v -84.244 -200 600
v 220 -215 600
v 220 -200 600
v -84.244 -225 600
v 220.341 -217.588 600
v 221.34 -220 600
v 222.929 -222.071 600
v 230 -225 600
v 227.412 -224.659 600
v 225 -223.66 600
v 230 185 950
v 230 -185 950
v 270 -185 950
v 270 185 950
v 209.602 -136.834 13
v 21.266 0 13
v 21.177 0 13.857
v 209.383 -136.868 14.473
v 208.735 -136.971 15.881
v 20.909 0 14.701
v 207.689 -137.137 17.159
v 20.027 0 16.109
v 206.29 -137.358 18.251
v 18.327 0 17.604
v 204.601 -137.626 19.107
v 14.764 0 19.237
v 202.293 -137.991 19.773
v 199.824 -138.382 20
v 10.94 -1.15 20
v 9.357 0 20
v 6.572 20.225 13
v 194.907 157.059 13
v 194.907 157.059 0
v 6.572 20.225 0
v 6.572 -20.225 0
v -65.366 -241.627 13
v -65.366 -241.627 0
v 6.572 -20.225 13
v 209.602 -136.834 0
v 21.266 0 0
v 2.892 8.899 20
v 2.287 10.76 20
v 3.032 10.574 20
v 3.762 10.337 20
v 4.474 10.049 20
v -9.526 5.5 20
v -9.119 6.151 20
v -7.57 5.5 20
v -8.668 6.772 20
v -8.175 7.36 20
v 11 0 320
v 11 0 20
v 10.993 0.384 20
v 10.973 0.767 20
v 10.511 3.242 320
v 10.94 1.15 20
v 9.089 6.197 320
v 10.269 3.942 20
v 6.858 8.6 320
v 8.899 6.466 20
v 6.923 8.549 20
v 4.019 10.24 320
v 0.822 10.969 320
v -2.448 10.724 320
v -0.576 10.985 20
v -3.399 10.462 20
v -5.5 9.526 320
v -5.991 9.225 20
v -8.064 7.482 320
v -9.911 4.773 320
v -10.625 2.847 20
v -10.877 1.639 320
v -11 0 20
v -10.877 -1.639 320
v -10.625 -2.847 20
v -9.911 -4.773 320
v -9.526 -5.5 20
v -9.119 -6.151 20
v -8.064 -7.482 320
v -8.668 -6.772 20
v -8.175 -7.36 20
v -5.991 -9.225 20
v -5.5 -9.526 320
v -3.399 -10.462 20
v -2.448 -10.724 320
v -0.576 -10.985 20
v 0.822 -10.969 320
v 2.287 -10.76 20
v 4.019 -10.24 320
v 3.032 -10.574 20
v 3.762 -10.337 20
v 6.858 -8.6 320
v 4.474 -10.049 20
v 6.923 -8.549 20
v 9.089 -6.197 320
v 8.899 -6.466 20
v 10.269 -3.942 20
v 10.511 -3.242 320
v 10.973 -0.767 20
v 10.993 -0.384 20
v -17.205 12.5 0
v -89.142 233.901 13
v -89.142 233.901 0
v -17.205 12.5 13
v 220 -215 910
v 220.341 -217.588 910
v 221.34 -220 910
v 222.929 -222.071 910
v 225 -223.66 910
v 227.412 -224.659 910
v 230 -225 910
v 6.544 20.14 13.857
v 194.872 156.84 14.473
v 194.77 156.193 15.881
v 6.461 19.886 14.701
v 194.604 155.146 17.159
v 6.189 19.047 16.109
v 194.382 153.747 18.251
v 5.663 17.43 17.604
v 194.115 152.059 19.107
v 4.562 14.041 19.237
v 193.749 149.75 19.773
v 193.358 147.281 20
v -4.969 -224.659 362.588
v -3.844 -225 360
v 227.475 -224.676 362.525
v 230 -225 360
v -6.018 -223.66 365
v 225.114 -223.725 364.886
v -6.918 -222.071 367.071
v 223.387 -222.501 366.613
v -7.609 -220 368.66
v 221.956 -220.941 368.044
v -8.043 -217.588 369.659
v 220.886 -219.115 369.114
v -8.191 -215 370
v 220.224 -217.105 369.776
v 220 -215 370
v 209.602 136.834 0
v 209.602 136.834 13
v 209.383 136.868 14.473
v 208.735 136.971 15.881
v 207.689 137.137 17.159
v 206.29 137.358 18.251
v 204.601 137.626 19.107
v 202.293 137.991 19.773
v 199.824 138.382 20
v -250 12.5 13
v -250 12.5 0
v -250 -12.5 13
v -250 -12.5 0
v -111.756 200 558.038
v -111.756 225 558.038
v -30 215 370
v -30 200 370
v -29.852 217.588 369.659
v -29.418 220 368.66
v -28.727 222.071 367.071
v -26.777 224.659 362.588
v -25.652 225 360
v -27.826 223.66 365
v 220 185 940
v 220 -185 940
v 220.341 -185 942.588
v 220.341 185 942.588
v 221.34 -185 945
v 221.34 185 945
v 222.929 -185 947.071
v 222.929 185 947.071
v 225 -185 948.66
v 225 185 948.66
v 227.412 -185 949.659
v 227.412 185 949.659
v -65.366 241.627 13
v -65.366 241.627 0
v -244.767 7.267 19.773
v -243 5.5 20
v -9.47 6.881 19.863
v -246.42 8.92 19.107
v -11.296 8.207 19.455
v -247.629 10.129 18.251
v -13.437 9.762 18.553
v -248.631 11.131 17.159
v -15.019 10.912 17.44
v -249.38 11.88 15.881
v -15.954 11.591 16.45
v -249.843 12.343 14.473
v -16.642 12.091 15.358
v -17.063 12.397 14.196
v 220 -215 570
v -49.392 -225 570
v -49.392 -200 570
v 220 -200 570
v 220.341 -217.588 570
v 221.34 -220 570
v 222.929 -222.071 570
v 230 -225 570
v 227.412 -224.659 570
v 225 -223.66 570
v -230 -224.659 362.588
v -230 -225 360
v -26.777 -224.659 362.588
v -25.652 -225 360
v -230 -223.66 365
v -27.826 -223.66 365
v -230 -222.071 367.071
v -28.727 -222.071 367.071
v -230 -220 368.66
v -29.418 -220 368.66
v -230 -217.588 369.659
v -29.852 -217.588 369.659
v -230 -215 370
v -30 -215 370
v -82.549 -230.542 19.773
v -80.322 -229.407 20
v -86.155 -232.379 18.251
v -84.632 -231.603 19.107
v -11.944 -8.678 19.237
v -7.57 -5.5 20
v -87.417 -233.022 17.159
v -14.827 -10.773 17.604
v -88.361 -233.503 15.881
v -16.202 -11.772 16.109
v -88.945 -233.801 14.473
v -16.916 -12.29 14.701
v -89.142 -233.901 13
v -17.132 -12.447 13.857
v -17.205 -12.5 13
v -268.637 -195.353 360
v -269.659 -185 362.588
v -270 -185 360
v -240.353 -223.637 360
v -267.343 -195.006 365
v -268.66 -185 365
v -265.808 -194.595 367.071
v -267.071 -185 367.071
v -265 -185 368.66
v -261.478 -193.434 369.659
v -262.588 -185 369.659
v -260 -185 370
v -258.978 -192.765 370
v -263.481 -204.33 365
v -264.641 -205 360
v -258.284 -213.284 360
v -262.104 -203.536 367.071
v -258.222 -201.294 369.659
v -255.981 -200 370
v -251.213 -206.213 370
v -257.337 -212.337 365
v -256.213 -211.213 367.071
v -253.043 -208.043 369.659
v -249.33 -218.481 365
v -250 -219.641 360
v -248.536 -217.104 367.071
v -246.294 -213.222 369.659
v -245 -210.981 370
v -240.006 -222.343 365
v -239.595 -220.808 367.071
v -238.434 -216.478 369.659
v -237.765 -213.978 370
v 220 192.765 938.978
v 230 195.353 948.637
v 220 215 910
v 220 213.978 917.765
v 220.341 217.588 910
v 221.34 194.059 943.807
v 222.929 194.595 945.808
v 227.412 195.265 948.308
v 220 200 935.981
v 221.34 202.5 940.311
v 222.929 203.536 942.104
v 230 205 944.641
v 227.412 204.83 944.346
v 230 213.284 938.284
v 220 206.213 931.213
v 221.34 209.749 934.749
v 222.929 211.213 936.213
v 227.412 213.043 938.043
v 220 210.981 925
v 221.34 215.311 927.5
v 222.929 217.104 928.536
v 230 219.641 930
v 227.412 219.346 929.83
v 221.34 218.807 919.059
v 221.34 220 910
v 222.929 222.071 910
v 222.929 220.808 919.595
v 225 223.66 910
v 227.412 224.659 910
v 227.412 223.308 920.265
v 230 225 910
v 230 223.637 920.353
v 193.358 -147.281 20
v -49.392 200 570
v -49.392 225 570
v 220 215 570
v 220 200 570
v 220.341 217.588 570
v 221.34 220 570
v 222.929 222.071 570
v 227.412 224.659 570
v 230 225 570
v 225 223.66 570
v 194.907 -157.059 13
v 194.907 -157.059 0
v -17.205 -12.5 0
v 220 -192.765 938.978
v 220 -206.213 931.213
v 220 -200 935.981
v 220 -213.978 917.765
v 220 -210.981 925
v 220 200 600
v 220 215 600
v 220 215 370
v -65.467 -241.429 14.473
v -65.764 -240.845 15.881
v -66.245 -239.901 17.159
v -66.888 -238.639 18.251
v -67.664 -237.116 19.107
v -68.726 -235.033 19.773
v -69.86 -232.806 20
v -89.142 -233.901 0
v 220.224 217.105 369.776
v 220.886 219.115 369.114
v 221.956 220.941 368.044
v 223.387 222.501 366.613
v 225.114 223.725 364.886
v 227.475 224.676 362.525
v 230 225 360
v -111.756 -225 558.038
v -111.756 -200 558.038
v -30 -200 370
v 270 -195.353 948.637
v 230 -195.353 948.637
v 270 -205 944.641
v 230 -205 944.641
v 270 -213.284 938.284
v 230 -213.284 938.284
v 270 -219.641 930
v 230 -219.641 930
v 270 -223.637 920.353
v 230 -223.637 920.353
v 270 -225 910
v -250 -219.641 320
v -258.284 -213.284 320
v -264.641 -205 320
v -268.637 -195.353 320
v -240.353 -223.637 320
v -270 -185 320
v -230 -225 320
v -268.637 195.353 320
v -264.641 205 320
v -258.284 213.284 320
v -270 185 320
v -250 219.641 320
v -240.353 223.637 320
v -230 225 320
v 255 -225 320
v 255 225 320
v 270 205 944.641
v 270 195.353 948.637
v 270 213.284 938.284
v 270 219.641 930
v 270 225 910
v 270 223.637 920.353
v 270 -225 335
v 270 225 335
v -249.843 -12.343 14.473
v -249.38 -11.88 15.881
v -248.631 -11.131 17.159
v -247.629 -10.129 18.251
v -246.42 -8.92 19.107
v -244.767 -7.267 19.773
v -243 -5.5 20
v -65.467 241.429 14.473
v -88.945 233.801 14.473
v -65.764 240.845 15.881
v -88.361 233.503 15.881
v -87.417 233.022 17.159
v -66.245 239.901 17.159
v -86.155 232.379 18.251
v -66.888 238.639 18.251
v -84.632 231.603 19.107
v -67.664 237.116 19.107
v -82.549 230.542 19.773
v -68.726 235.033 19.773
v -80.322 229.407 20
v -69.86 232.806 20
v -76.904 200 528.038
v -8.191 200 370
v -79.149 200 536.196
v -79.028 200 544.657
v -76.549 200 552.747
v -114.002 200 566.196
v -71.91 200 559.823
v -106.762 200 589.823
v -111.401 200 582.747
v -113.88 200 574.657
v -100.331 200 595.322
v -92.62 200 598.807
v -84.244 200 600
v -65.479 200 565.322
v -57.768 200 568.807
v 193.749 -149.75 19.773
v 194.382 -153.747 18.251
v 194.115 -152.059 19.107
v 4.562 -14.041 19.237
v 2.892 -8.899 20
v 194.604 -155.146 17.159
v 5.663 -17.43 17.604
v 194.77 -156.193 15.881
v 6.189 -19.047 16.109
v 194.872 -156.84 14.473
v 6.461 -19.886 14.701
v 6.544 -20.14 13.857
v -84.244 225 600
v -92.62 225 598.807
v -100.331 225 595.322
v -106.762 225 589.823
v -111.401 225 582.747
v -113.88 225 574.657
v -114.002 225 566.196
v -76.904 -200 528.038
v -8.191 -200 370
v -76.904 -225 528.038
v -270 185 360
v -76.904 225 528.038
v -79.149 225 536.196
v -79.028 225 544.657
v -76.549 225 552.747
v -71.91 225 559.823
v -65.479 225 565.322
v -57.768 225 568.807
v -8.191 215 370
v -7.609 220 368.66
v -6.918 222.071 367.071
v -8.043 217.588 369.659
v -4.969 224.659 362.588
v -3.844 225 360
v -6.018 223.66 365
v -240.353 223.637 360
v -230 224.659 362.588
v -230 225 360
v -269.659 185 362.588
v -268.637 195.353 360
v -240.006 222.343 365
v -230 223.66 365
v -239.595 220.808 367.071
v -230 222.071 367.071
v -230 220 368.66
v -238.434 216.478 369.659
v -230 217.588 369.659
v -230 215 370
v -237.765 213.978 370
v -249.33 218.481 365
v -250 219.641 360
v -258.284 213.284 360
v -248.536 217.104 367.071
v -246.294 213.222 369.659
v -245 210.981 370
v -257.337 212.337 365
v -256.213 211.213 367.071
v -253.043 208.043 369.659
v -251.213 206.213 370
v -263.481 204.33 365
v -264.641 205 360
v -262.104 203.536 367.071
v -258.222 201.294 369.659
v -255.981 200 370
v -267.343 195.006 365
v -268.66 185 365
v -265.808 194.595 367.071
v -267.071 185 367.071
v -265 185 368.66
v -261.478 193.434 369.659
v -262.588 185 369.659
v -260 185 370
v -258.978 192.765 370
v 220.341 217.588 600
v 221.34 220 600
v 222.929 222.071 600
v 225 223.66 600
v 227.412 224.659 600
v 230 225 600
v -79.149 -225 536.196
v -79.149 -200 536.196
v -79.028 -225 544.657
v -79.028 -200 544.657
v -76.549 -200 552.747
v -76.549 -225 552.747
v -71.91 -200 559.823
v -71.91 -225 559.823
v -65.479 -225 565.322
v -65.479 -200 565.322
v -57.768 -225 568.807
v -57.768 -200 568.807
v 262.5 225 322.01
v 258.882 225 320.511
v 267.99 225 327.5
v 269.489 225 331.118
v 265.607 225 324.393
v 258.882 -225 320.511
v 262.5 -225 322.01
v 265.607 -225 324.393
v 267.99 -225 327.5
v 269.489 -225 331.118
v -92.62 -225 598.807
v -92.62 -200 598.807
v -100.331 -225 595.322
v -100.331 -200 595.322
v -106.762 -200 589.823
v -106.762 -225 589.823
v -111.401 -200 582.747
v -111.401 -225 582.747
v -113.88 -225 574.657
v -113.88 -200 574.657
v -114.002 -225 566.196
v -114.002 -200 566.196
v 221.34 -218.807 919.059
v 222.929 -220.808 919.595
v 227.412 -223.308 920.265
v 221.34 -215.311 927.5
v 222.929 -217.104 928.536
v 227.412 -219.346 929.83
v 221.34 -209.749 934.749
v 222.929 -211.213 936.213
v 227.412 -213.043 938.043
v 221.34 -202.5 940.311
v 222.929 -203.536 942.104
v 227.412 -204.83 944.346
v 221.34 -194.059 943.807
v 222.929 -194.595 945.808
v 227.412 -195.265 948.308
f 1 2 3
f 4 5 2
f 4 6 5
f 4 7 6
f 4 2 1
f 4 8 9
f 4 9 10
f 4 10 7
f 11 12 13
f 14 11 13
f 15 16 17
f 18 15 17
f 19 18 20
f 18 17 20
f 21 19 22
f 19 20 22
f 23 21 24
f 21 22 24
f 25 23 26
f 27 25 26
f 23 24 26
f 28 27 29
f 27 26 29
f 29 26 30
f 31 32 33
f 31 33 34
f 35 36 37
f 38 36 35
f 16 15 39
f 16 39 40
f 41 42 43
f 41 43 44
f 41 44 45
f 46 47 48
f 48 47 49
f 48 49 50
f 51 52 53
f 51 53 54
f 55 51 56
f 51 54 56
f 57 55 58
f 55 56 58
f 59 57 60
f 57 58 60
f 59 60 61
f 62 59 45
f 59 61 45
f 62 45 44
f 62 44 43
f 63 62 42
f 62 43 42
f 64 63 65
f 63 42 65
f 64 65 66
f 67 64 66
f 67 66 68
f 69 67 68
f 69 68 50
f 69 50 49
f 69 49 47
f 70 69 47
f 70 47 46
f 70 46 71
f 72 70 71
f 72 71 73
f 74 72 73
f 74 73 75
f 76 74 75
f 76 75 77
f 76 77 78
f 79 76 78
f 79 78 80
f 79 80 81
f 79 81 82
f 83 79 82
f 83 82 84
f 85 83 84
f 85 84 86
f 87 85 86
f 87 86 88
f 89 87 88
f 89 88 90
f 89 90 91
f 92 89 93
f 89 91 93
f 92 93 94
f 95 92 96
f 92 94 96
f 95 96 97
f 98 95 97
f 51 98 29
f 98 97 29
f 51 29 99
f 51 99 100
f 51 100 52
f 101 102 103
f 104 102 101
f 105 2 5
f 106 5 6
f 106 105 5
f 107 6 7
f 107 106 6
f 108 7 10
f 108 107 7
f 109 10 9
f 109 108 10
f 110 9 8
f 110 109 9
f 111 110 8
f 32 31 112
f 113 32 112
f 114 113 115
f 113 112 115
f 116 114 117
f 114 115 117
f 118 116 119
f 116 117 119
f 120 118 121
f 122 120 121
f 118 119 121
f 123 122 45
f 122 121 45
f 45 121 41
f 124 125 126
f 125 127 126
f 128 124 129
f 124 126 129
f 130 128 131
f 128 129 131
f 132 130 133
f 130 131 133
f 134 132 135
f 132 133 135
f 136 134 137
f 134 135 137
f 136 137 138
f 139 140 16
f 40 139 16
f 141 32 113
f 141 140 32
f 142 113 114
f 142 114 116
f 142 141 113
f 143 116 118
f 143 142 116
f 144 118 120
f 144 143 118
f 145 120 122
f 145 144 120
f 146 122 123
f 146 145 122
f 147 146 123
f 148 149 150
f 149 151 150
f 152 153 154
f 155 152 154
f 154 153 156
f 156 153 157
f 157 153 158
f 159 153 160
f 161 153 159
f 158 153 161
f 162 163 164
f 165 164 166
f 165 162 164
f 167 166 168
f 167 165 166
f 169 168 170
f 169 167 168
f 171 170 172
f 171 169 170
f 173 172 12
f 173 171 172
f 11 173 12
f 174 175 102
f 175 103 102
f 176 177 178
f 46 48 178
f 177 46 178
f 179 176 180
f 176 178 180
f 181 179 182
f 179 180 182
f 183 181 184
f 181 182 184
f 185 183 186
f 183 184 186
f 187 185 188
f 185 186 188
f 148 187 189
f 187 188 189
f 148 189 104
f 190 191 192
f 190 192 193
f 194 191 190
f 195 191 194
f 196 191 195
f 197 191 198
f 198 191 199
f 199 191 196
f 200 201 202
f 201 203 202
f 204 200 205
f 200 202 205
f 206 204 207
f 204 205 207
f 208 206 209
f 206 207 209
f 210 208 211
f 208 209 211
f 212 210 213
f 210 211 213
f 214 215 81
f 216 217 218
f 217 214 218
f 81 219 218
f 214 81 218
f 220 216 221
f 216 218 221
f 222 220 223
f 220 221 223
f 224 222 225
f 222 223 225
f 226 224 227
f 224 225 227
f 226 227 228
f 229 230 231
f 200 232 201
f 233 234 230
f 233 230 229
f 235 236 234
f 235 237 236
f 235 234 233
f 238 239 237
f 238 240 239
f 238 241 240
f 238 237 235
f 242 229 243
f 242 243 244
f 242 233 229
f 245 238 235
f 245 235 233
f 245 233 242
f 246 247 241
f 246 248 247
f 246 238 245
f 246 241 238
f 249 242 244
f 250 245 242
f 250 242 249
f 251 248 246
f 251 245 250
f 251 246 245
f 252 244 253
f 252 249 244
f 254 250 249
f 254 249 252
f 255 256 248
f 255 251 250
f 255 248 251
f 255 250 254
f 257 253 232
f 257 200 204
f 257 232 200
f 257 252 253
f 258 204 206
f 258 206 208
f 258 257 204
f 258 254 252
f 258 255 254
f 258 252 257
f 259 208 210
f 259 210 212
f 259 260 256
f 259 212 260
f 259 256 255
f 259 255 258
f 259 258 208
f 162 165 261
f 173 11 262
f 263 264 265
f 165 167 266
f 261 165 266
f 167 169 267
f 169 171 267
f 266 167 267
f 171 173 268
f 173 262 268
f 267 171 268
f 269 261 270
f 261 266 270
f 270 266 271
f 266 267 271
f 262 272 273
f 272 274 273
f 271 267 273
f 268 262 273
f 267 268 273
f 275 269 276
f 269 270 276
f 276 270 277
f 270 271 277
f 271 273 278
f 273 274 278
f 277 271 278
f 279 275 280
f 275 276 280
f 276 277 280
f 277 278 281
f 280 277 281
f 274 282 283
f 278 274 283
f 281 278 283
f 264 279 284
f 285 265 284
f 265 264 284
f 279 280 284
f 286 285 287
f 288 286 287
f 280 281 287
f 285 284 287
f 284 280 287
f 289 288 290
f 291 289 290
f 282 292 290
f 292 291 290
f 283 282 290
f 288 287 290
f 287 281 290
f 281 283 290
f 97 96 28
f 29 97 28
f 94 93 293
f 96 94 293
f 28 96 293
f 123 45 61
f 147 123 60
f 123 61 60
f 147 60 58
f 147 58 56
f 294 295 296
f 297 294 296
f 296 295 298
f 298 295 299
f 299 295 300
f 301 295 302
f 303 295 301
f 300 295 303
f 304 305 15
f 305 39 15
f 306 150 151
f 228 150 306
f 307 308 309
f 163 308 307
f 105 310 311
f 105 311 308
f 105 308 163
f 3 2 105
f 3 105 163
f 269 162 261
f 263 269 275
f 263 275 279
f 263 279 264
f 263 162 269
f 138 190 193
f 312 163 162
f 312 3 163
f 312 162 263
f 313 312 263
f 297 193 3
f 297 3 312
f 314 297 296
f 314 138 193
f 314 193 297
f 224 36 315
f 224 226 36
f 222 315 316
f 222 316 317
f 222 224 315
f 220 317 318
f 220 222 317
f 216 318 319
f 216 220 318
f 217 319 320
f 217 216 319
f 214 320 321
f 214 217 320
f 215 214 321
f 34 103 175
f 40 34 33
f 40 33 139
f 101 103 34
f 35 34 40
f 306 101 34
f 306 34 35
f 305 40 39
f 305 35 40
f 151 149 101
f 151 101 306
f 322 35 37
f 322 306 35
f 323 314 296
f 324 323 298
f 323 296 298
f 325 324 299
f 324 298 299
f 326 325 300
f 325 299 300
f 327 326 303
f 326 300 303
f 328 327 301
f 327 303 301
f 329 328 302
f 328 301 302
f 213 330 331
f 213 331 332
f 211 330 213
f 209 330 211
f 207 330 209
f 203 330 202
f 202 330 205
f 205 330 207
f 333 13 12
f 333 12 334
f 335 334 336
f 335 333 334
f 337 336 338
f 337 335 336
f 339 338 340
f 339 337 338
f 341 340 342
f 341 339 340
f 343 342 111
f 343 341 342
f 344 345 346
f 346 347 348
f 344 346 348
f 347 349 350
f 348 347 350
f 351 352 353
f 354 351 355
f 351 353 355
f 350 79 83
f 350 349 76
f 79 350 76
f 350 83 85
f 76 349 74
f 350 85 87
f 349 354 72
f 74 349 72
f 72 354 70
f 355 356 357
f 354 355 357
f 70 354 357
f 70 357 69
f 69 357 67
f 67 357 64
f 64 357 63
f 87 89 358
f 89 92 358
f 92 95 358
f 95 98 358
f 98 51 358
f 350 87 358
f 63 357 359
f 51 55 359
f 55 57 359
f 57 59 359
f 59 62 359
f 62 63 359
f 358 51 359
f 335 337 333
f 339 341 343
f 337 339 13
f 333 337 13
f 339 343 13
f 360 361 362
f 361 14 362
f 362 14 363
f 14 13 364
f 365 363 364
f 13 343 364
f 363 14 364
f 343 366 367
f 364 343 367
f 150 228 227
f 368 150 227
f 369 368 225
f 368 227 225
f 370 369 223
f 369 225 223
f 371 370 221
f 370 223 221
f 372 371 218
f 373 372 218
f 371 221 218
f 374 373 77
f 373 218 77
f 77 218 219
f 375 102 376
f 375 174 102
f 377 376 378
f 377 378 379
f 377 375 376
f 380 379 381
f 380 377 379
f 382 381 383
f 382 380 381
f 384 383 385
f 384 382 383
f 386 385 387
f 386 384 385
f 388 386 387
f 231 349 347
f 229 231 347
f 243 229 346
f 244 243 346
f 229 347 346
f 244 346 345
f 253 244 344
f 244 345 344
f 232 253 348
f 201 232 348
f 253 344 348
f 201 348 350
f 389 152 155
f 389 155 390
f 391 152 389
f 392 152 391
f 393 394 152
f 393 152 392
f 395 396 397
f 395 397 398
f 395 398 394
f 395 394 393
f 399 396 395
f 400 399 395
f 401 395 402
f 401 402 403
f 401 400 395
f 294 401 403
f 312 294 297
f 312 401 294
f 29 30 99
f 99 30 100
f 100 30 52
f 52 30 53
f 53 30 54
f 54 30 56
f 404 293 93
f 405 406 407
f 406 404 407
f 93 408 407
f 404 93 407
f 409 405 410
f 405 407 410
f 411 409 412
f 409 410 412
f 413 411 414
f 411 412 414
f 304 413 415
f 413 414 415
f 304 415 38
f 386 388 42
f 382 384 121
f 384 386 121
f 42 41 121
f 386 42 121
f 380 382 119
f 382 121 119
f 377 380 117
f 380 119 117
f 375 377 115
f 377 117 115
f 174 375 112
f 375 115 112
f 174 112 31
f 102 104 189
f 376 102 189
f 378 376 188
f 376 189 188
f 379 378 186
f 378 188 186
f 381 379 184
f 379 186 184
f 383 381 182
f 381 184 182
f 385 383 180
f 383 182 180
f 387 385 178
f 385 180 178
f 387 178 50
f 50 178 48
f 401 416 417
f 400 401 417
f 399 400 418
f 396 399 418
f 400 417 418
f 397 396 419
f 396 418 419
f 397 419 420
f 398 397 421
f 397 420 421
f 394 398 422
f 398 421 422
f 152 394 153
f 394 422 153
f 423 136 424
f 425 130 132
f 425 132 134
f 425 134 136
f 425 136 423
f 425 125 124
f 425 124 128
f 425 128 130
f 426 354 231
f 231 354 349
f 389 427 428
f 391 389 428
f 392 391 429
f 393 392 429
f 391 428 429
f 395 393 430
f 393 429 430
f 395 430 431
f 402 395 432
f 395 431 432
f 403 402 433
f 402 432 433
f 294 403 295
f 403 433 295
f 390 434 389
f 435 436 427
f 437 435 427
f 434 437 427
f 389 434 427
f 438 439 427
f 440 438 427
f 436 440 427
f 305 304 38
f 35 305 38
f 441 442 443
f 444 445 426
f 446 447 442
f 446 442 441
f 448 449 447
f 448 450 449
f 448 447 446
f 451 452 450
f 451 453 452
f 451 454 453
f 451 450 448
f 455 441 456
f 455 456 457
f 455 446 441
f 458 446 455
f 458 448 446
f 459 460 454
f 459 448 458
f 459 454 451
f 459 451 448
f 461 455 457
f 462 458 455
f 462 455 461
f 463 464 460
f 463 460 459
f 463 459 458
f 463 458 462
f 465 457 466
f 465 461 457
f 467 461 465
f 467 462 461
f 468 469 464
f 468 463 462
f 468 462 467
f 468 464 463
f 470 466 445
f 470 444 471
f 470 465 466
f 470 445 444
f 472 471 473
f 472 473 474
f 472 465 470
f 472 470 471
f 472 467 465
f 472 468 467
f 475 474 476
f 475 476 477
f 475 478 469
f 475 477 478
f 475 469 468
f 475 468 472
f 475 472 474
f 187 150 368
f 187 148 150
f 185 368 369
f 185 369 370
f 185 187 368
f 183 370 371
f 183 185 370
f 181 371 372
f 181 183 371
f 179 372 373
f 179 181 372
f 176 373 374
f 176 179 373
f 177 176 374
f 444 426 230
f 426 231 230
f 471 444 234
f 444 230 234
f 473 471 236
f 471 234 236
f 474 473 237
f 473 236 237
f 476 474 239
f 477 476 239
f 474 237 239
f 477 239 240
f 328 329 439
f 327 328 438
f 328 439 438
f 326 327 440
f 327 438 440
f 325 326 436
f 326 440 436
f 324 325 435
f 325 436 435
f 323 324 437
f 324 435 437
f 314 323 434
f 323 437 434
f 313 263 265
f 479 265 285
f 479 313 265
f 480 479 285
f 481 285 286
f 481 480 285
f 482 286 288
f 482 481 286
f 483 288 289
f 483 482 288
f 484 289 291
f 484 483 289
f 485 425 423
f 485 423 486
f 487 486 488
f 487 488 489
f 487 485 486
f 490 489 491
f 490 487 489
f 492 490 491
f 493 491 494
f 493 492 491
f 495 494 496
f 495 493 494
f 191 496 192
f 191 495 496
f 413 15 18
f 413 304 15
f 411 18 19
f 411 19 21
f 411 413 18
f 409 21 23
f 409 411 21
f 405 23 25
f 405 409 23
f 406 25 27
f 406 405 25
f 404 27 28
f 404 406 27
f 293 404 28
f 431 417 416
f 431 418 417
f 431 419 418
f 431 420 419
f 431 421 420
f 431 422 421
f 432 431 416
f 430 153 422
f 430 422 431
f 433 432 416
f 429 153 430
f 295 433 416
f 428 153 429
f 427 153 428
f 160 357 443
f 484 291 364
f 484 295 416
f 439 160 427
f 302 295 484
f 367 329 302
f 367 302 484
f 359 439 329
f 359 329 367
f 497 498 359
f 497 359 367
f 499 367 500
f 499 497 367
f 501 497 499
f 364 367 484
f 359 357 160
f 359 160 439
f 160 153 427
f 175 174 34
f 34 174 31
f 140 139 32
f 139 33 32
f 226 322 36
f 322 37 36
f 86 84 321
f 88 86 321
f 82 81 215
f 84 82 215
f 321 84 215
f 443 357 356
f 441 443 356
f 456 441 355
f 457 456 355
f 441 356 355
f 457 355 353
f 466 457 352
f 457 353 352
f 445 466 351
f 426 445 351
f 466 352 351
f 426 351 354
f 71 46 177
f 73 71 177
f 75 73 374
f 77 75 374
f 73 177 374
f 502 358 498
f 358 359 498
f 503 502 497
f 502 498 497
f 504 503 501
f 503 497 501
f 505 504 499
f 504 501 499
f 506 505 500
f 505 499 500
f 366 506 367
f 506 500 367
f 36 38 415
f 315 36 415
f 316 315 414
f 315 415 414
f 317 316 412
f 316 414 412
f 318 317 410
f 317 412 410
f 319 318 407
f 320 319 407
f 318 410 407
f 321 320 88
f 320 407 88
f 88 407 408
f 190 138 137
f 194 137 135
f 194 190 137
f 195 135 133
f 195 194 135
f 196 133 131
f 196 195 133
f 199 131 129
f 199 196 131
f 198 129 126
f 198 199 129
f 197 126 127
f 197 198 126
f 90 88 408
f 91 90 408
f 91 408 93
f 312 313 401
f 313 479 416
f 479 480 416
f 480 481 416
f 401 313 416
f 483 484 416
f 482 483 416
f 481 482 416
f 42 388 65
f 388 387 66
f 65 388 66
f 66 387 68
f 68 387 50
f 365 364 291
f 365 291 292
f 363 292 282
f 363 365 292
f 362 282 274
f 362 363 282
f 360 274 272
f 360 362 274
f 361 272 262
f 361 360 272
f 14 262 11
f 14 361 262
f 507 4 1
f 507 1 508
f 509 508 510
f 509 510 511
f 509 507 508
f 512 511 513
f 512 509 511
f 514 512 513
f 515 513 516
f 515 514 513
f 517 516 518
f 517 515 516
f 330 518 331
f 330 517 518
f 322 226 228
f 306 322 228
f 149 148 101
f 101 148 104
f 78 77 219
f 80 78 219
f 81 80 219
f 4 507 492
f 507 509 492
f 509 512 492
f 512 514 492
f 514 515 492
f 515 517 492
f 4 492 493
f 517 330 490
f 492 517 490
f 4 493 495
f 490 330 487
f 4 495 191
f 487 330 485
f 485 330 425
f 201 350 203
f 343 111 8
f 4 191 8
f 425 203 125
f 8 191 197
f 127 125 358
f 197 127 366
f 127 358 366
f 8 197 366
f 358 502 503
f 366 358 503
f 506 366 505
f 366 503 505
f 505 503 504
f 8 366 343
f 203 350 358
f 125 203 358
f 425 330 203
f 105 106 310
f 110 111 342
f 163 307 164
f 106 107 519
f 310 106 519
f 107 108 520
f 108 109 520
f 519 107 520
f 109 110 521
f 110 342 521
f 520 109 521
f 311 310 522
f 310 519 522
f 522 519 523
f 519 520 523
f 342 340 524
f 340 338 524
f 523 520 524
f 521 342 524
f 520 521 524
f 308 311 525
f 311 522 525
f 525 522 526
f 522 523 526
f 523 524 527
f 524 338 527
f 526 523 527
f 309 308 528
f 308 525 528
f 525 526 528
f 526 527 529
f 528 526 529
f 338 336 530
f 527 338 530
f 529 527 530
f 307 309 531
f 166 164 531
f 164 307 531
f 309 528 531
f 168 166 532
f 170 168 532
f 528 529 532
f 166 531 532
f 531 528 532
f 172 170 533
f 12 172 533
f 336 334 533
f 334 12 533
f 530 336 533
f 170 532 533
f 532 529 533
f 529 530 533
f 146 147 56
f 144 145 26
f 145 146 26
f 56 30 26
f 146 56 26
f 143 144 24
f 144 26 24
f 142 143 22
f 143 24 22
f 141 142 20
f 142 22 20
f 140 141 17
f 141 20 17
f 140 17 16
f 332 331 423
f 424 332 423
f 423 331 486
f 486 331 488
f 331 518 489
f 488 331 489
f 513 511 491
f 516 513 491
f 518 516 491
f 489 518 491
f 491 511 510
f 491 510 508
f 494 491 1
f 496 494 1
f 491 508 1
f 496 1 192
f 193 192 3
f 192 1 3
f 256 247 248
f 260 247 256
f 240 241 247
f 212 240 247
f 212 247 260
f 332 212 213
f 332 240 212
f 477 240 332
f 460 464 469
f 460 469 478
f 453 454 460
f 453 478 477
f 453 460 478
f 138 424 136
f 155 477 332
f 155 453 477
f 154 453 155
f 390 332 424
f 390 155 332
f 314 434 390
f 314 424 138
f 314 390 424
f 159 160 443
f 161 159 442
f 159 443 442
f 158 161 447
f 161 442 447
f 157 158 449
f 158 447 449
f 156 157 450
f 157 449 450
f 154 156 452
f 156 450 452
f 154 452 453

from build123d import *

# Parameters (mm, degrees)
F0_W      = 250
F0_H      = 20
F1_DEPTH  = 12.5
F2_R      = 7
F4_COUNT  = 5
F5_R      = 11
F6_DEPTH  = 300
F7_R      = 11
F8_DEPTH  = 50
F9_W      = 50
F9_H      = 450
F10_DEPTH = 580
F12_DEPTH = 25
F14_R     = 40
F15_R     = 10
F16_R     = 15


with BuildPart() as f1:
    # F0 (on Front) → F1 (new body, symmetric)
    with BuildSketch(Plane.XZ):
        with Locations((-125, 10)):
            Rectangle(F0_W, F0_H)
    extrude(amount=F1_DEPTH, both=True)

    # F2
    f2_edges = [f1.edges().sort_by_distance(p)[0] for p in [
        (-125, -12.5, 20),
        (-250, 0, 20),
        (-125, 12.5, 20),
    ]]
    fillet(f2_edges, radius=F2_R)

    # F4: F1 ×5 about axis
    f4_axis = Axis((0, 0, 61.4663511515), (0, 0, 1))


with BuildPart() as f1_1:
    add(f1.part)
    for i in range(1, F4_COUNT):
        add(f1.part.rotate(f4_axis, i * 360 / F4_COUNT))

    # F5 (on face) → F6 (join)
    with BuildSketch(Plane.XY.offset(20)):
        Circle(F5_R)
    extrude(amount=F6_DEPTH)

    # F7 (on face) → F8 (join)
    with BuildSketch(Plane.XY.offset(320)):
        with BuildLine():
            Line((270, -225), (270, 225))
            Line((270, 225), (-230, 225))
            ThreePointArc((-230, 225), (-258.2842712475, 213.2842712475), (-270, 185))
            Line((-270, 185), (-270, -185))
            ThreePointArc((-270, -185), (-258.2842712475, -213.2842712475), (-230, -225))
            Line((-230, -225), (270, -225))
        make_face()
        Circle(F7_R, mode=Mode.SUBTRACT)
        Circle(F7_R)
    extrude(amount=F8_DEPTH)

    # F9 (on face) → F10 (join)
    with BuildSketch(Plane.XY.offset(370)):
        with Locations((245, 0)):
            Rectangle(F9_W, F9_H)
    extrude(amount=F10_DEPTH)

    # F11 (on face) → F12 (join)
    with BuildSketch(Plane.XZ.offset(225)):
        with BuildLine():
            Line((220, 570), (220, 600))
            Line((220, 600), (-84.2436446853, 600))
            ThreePointArc((-84.2436446853, 600), (-109.3320234718, 586.4491109141), (-111.7557463729, 558.0382166576))
            Line((-111.7557463729, 558.0382166576), (-30, 370))
            Line((-30, 370), (-8.1914152974, 370))
            Line((-8.1914152974, 370), (-76.9036834094, 528.0382166576))
            ThreePointArc((-76.9036834094, 528.0382166576), (-74.4799605083, 556.4491109141), (-49.3915817218, 570))
            Line((-49.3915817218, 570), (220, 570))
        make_face()
    extrude(amount=-F12_DEPTH)

    # F13: F1 across plane


with BuildPart() as f1_2:
    add(f1_1.part)
    add(f1_1.part.mirror(Plane.XZ))

    # F14
    f14_edges = [f1_2.edges().sort_by_distance(p)[0] for p in [
        (245, -225, 950),
        (245, 225, 950),
    ]]
    fillet(f14_edges, radius=F14_R)

    # F15
    f15_edges = [f1_2.edges().sort_by_distance(p)[0] for p in [
        (220, 0, 950),
        (220, -213.284271, 938.284271),
        (220, -225, 755),
        (220, 225, 755),
        (220, 213.284271, 938.284271),
        (220, 225, 470),
        (220, -225, 470),
        (105.904292, -225, 370),
        (-130, -225, 370),
        (105.904292, 225, 370),
    ]]
    fillet(f15_edges, radius=F15_R)

    # F16
    f16_edges = [f1_2.edges().sort_by_distance(p)[0] for p in [
        (270, 0, 320),
    ]]
    fillet(f16_edges, radius=F16_R)


solid = f1_2.part
